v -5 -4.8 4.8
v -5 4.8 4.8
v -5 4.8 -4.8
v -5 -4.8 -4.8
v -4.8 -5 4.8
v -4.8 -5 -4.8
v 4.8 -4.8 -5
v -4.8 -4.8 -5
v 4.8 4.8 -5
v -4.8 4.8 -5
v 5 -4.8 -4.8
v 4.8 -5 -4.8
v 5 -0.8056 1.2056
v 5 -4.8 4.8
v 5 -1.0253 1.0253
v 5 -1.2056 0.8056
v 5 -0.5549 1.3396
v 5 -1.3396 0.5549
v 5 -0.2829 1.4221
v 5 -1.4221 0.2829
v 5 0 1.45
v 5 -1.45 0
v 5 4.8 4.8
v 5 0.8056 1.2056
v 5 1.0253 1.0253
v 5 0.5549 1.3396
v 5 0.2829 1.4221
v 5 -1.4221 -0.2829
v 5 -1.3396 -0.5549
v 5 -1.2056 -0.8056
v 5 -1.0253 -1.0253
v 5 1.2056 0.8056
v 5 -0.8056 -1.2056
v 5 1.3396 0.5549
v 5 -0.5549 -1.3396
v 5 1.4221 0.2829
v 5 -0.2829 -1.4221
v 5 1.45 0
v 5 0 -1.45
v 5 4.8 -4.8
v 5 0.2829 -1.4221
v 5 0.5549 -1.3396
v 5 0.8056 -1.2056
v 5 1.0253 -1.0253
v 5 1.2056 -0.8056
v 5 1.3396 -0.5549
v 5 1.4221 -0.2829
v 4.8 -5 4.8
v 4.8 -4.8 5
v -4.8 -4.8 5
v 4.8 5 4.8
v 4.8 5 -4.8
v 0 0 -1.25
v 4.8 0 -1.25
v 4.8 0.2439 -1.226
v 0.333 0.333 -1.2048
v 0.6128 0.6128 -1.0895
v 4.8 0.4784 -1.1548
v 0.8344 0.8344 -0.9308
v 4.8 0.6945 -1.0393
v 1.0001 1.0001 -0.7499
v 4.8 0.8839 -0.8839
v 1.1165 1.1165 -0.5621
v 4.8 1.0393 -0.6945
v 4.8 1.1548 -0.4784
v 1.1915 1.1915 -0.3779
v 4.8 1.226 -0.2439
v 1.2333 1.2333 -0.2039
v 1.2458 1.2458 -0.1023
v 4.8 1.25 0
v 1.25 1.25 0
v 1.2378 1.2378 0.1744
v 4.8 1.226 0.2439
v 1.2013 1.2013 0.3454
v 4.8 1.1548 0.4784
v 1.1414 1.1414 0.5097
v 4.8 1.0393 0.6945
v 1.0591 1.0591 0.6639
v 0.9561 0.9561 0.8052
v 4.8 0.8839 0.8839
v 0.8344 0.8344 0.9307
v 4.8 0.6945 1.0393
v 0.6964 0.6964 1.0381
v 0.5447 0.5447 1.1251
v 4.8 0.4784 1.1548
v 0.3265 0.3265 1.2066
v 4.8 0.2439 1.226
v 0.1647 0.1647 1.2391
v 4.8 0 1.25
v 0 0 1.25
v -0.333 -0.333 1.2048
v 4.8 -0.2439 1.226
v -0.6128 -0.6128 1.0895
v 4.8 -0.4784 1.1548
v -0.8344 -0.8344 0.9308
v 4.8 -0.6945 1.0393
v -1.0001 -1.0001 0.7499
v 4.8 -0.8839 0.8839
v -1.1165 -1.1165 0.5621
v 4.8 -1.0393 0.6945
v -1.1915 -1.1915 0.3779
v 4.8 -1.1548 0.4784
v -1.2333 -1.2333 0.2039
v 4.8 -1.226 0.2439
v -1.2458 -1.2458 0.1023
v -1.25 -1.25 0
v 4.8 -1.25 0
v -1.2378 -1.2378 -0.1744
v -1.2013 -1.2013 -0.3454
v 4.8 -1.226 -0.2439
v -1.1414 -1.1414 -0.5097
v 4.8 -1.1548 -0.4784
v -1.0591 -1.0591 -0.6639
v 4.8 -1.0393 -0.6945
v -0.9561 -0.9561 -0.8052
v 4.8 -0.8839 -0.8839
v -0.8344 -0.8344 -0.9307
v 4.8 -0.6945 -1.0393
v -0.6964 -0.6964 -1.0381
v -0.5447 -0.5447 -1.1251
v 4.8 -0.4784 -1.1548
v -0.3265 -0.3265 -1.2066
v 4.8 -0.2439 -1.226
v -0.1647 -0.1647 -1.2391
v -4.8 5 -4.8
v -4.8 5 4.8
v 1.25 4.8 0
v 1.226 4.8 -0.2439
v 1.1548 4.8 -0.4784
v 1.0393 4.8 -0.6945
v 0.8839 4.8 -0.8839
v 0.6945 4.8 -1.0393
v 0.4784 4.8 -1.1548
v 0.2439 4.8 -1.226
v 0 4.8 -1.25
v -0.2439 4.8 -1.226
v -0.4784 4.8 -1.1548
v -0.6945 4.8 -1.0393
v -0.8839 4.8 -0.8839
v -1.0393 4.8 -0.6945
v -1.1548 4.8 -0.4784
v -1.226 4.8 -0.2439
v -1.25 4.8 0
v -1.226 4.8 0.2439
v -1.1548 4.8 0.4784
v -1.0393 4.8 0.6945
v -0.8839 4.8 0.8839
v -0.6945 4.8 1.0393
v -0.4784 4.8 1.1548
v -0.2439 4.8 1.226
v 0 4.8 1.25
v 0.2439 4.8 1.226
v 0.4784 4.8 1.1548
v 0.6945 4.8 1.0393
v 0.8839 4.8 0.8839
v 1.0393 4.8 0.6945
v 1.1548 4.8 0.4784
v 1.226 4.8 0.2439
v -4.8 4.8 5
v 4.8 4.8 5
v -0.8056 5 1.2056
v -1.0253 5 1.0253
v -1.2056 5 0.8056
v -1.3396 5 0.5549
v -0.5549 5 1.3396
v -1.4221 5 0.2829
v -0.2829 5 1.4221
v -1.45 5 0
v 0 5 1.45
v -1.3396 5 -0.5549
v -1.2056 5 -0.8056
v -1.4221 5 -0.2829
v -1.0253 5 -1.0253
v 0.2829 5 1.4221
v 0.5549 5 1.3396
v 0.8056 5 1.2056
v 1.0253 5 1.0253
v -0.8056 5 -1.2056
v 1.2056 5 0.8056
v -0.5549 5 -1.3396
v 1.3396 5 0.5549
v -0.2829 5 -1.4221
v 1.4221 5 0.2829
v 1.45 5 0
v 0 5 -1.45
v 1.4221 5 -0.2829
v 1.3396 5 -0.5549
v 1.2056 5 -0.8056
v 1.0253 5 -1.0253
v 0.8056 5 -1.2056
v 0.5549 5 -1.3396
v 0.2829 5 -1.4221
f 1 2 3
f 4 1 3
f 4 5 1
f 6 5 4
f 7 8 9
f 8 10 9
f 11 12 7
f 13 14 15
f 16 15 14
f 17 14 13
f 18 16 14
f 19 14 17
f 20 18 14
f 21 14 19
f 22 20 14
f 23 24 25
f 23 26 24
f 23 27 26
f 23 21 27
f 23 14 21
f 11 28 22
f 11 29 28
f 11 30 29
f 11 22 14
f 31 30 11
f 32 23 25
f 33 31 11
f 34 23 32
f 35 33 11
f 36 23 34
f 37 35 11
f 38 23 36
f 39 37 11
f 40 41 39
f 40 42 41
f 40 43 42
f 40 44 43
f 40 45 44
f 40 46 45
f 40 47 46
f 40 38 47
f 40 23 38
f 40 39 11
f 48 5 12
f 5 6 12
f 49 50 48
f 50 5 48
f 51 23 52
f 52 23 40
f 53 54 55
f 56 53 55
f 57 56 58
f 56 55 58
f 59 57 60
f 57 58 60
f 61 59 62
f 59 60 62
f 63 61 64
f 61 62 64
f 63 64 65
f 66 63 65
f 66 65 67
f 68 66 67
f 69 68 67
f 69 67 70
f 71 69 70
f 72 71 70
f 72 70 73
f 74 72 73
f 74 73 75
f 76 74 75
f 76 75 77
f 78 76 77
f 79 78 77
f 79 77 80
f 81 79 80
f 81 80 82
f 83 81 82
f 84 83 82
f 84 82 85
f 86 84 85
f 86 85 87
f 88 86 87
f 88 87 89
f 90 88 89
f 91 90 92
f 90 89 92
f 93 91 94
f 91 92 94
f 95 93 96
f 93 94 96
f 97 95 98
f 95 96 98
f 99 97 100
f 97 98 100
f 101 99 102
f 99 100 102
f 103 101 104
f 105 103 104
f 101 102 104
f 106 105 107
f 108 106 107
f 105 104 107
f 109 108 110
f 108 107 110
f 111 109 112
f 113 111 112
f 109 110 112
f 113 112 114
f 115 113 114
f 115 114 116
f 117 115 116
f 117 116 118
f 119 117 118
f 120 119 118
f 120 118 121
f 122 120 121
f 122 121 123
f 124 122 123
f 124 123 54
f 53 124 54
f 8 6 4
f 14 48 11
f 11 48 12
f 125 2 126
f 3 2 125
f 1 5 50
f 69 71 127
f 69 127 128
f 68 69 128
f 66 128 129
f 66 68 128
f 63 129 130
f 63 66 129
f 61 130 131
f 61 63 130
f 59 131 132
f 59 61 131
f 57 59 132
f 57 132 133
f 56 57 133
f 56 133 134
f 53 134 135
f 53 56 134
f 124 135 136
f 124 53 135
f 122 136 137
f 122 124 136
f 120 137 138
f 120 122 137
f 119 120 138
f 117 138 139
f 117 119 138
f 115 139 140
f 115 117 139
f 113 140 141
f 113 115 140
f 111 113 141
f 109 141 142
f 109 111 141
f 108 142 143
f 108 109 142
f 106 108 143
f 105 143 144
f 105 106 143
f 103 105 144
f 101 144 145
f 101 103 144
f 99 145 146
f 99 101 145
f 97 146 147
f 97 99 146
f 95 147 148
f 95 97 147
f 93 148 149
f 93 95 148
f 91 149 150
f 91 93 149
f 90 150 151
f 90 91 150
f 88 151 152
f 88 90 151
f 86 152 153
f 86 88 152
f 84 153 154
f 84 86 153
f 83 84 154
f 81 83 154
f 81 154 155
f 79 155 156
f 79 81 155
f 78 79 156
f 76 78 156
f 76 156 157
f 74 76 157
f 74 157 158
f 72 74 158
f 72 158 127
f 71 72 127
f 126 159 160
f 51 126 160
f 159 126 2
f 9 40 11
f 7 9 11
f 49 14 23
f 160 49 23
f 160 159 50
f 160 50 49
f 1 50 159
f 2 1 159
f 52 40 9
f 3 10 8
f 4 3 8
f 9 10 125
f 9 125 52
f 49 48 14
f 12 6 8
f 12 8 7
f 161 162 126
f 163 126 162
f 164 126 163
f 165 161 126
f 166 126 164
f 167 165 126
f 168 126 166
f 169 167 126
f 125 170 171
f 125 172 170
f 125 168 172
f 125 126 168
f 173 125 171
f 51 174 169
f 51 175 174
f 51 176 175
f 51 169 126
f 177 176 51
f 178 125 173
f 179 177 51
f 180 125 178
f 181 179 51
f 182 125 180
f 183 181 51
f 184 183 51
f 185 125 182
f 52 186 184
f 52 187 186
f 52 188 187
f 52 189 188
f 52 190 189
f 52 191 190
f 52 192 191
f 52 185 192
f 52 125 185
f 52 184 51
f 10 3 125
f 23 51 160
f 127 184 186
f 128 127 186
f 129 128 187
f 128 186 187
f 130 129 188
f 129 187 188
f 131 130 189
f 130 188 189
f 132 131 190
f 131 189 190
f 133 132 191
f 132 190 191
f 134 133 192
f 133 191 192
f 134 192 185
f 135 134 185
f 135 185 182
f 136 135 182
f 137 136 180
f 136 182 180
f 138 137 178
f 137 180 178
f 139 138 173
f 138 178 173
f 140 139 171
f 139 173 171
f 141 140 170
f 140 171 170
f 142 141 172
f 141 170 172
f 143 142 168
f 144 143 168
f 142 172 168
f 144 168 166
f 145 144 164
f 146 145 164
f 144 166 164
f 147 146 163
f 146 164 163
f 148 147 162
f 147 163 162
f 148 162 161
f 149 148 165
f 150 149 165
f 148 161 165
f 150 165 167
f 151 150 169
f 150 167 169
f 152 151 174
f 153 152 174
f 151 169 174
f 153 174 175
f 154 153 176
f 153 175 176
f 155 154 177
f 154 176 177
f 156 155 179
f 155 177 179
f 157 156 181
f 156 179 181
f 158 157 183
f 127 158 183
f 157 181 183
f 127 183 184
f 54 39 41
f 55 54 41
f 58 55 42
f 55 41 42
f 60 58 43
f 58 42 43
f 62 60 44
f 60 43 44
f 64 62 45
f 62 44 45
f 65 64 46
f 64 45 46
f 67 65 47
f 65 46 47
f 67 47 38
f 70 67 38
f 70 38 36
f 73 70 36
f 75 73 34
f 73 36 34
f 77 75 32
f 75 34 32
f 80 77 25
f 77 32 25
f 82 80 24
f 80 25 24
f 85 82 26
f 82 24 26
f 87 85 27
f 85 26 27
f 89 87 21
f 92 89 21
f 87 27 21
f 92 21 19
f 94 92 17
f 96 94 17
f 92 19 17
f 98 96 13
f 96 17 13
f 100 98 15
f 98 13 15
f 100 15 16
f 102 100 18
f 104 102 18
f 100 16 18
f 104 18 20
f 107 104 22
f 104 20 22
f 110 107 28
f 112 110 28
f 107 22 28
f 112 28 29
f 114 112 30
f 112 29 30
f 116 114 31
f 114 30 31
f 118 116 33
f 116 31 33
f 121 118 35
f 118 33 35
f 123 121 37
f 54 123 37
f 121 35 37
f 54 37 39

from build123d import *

# Parameters (mm, degrees)
SKETCH_1_W                   = 10
SKETCH_1_H                   = 10
EXTRUDE_1_DEPTH              = 5
HOLE_START                   = 1.25
HOLE_WIZARD_M3_2_OUTLINE_R   = 1.25
HOLE_WIZARD_M3_2_DEPTH       = 3.75
HOLE_START_2                 = -1.2500001
HOLE_WIZARD_M3_2_2_OUTLINE_R = 1.25
HOLE_WIZARD_M3_2_2_DEPTH     = 2.5000001
HOLE_WIZARD_M3_2_3_OUTLINE_W = 6
HOLE_WIZARD_M3_2_3_OUTLINE_H = 6
HOLE_WIZARD_M3_2_3_DEPTH     = 3
HOLE_WIZARD_M3_3_REACH       = 14.247
HOLE_WIZARD_M3_3_BORE_R      = 1.25
CHAMFER_1_SIZE               = 0.2


with BuildPart() as part:
    # 草图1 → 凸台-拉伸1 (new, symmetric)
    with BuildSketch(Plane(origin=(0, 0, 0), x_dir=(1, 0, 0), z_dir=(0, 1, 0))):
        Rectangle(SKETCH_1_W, SKETCH_1_H)
    extrude(amount=EXTRUDE_1_DEPTH, both=True)

    # M3 螺纹孔2: read off the stored shape, not the designer's step
    # M3 螺纹孔2 outline → M3 螺纹孔2 (cut)
    with BuildSketch(Plane(origin=(0, 0, 0), x_dir=(1, 0, 0), z_dir=(0, 1, 0)).offset(HOLE_START)):
        Circle(HOLE_WIZARD_M3_2_OUTLINE_R)
    extrude(amount=HOLE_WIZARD_M3_2_DEPTH, mode=Mode.SUBTRACT)

    # Hole Wizard M3 _2 2 outline → Hole Wizard M3 _2 2 (cut)
    with BuildSketch(Plane(origin=(0, 0, 0), x_dir=(1, 0, 0), z_dir=(0, 1, 0)).offset(HOLE_START_2)):
        Circle(HOLE_WIZARD_M3_2_2_OUTLINE_R)
    extrude(amount=HOLE_WIZARD_M3_2_2_DEPTH, mode=Mode.SUBTRACT)

    # Hole Wizard M3 _2 3 outline → Hole Wizard M3 _2 3 (add)
    with BuildSketch(Plane(origin=(0, 0, 0), x_dir=(0.707106781186548, 0.707106781186547, 0), z_dir=(0.707106781186547, -0.707106781186548, 0))):
        Rectangle(HOLE_WIZARD_M3_2_3_OUTLINE_W, HOLE_WIZARD_M3_2_3_OUTLINE_H)
    extrude(amount=HOLE_WIZARD_M3_2_3_DEPTH)

    # M3 螺纹孔3 bore → M3 螺纹孔3 (cut, up to next)
    with BuildSketch(Plane(origin=(5, 0, 0), x_dir=(0, 0, -1), z_dir=(1, 0, 0)), mode=Mode.PRIVATE) as hole_wizard_m3_3_sk1:
        Circle(HOLE_WIZARD_M3_3_BORE_R)
    hole_wizard_m3_3_tool1 = extrude(hole_wizard_m3_3_sk1.sketch, amount=-HOLE_WIZARD_M3_3_REACH, mode=Mode.PRIVATE) & part.part
    add(hole_wizard_m3_3_tool1.solids().sort_by_distance((5, 0, 0))[0], mode=Mode.SUBTRACT)

    # 倒角1
    chamfer_1_edges = [part.edges().sort_by_distance(p)[0] for p in [
        (-5, 5, 0),
        (-1.25, 5, 0),
        (0, 5, 5),
        (5, 0, 1.25),
        (5, 5, 0),
        (0, -5, 5),
        (-5, -5, 0),
        (0, -5, -5),
        (5, -5, 0),
        (5, 0, 5),
        (-5, 0, 5),
        (-5, 0, -5),
        (5, 0, -5),
        (0, 5, -5),
    ]]
    chamfer(chamfer_1_edges, length=CHAMFER_1_SIZE)


solid = part.part
